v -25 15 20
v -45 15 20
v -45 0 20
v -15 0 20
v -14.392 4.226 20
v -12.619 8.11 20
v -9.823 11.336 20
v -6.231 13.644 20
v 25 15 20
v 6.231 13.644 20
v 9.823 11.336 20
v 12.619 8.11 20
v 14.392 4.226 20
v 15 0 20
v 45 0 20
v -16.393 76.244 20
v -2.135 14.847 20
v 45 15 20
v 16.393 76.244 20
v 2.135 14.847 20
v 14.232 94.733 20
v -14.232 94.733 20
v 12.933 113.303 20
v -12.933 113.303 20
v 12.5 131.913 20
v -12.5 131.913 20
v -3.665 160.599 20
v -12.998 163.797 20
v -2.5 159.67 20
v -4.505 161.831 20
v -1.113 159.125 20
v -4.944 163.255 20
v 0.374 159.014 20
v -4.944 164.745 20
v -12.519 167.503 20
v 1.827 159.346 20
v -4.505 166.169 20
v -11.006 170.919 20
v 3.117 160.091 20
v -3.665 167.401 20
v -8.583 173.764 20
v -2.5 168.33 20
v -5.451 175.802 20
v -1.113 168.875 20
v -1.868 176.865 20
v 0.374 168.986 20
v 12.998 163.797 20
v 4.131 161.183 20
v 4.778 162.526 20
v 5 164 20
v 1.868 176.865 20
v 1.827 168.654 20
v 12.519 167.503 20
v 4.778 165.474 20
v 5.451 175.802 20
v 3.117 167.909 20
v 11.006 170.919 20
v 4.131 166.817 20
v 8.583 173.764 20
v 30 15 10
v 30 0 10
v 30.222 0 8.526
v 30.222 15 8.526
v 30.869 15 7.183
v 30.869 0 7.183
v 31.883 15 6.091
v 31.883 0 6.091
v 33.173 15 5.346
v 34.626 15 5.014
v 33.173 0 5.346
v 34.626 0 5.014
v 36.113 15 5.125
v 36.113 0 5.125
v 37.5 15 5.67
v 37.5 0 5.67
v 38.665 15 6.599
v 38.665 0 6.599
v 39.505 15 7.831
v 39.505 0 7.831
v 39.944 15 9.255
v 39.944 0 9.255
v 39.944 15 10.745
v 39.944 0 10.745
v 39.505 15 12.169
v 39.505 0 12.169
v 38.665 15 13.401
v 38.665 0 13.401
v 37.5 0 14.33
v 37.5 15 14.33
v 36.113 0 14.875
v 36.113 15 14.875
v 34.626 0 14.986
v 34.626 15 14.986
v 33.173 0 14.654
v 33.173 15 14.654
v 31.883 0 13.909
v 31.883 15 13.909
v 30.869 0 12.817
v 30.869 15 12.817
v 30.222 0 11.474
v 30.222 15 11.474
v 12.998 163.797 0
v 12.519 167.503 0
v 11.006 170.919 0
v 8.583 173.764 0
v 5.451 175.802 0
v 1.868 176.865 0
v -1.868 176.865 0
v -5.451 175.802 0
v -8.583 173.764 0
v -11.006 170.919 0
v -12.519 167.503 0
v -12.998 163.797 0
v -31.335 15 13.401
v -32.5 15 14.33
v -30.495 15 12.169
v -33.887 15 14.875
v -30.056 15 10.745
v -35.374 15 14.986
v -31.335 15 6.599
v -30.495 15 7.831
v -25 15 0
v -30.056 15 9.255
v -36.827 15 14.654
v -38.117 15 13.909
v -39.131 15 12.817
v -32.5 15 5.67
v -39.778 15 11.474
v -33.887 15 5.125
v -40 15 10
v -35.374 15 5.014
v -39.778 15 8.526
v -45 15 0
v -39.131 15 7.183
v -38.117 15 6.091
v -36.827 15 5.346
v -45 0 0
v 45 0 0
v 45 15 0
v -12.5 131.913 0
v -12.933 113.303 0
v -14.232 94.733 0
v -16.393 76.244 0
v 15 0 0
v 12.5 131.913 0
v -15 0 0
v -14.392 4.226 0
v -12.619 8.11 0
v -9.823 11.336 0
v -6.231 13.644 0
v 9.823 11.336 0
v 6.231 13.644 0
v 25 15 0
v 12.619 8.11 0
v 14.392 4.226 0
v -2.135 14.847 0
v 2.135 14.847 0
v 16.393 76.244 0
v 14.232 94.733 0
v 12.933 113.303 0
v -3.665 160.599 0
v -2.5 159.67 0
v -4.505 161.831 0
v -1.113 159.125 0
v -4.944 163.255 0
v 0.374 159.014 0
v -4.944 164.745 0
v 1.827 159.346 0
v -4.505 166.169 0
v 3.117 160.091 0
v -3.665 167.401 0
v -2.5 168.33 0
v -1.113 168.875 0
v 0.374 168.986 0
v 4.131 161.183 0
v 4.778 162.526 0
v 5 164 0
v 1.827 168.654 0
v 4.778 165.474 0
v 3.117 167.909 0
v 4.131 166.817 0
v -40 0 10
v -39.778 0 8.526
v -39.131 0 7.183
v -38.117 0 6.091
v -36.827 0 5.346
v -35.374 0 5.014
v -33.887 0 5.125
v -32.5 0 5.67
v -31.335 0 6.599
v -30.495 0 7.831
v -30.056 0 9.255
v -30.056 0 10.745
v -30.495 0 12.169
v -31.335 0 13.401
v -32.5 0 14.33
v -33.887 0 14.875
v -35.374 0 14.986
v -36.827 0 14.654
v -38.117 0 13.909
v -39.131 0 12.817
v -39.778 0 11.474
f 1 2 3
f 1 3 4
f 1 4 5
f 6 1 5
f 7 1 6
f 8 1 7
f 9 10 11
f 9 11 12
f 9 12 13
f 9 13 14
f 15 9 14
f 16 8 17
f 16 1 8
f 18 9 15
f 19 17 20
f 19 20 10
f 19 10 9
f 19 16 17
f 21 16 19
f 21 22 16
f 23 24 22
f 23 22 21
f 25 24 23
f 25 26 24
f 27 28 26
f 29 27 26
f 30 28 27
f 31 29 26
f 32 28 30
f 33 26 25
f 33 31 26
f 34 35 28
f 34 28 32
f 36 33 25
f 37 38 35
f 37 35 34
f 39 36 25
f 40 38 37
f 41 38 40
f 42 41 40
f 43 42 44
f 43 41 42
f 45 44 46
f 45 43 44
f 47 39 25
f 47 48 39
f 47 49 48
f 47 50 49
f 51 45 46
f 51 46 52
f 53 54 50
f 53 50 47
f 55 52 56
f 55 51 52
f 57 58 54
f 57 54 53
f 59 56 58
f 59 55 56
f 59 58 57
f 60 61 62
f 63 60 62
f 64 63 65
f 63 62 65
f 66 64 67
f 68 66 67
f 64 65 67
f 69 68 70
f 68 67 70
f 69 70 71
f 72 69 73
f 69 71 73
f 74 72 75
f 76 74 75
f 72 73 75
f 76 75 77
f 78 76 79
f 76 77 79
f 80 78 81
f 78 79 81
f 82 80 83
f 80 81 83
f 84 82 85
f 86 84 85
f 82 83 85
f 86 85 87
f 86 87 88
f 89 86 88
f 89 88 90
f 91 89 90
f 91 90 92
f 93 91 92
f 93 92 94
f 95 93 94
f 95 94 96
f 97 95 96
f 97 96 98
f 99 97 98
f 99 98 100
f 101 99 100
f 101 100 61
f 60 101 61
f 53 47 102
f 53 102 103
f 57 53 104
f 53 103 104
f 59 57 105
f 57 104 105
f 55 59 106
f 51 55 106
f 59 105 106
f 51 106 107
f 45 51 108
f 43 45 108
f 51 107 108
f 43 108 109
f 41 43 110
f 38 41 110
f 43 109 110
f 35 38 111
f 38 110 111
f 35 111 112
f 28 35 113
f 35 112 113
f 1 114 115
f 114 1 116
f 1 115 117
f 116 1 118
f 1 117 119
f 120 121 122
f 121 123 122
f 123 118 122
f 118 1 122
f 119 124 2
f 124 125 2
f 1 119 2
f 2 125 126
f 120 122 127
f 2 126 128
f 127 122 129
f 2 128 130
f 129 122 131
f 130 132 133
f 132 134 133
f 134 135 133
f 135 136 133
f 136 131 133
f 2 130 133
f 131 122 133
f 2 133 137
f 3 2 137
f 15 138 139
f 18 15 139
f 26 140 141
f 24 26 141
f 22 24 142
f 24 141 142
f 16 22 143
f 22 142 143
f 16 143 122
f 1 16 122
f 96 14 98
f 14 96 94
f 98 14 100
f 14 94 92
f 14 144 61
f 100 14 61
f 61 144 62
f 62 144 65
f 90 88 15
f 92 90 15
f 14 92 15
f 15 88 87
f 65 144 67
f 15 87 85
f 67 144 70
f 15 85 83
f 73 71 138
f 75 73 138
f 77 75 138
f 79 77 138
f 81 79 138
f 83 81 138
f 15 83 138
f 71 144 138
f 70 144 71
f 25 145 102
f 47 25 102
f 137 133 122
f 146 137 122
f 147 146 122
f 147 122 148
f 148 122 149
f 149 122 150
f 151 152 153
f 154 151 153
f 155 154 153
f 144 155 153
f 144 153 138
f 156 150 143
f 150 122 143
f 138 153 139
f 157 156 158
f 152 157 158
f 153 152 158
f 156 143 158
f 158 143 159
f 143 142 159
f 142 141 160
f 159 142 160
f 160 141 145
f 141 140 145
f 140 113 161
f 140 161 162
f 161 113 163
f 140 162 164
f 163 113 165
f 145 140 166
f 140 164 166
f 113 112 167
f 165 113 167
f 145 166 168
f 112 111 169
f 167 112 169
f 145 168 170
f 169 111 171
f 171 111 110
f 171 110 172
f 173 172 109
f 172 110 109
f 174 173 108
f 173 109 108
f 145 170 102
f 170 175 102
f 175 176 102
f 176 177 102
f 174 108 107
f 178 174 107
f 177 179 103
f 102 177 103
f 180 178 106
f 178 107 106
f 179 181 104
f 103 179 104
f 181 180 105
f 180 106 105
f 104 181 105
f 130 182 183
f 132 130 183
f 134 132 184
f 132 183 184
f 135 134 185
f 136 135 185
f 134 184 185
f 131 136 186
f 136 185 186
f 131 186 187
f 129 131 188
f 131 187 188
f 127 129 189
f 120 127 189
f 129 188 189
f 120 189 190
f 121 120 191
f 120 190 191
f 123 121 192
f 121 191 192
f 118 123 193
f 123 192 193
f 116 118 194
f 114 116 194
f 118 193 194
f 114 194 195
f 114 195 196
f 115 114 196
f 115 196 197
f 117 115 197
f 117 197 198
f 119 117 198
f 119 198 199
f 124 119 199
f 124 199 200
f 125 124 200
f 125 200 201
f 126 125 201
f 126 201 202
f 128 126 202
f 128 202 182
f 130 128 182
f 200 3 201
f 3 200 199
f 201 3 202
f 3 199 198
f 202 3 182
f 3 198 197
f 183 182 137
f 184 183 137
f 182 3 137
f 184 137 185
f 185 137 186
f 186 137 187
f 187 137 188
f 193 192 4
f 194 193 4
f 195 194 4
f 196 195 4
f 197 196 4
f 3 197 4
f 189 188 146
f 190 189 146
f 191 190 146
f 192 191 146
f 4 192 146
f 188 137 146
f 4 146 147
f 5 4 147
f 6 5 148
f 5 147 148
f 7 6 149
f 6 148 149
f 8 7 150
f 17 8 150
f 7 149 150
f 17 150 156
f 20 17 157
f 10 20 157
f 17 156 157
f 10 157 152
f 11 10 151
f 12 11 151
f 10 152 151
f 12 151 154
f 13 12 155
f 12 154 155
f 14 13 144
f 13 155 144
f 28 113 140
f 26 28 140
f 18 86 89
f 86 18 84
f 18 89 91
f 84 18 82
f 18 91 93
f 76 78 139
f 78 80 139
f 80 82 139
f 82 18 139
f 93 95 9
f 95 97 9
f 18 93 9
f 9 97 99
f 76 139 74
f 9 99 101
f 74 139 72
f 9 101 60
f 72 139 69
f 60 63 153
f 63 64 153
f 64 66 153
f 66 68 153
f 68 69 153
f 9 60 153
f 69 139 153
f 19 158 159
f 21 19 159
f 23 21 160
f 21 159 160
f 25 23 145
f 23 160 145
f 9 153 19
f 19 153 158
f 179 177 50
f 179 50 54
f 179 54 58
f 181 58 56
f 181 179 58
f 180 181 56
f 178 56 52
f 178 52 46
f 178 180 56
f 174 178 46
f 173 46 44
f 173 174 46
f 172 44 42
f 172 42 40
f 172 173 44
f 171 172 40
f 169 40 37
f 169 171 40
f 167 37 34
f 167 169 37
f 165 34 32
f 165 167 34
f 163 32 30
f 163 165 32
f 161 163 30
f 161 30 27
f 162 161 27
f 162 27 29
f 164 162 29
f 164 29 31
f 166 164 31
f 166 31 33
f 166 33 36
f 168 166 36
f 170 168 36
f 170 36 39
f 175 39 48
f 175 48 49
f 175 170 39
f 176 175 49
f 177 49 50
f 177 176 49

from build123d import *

# Parameters (mm, degrees)
SKETCH2_R             = 5
BOSS_EXTRUDE2_DEPTH   = 20
F_1_0MM_DOWEL_HOLE1_D = 10


with BuildPart() as part:
    # Sketch2 → Boss-Extrude2 (new body)
    with BuildSketch(Plane.XY):
        with BuildLine():
            Line((12.5, 131.912846307), (12.998411943, 163.796808069))
            ThreePointArc((12.998411943, 163.796808069), (0, 177), (-12.998411943, 163.796808069))
            Line((-12.998411943, 163.796808069), (-12.5, 131.912846307))
            ThreePointArc((-12.5, 131.912846307), (-13.474379896, 104.01025681), (-16.392772503, 76.243605923))
            Line((-16.392772503, 76.243605923), (-25, 15))
            Line((-25, 15), (-45, 15))
            Line((-45, 15), (-45, 0))
            Line((-45, 0), (-15, 0))
            ThreePointArc((-15, 0), (0, 15), (15, 0))
            Line((15, 0), (45, 0))
            Line((45, 0), (45, 15))
            Line((45, 15), (25, 15))
            Line((25, 15), (16.392772503, 76.243605923))
            ThreePointArc((16.392772503, 76.243605923), (13.474379896, 104.01025681), (12.5, 131.912846307))
        make_face()
        with Locations((0, 164)):
            Circle(SKETCH2_R, mode=Mode.SUBTRACT)
    extrude(amount=BOSS_EXTRUDE2_DEPTH)

    # Ø1.0mm Dowel Hole1 (through all)
    with Locations(Plane(origin=(0, 15, 0), x_dir=(1, 0, 0), z_dir=(0, 1, 0))):
        with Locations((-35, -10), (35, -10)):
            Hole(F_1_0MM_DOWEL_HOLE1_D / 2)


solid = part.part
